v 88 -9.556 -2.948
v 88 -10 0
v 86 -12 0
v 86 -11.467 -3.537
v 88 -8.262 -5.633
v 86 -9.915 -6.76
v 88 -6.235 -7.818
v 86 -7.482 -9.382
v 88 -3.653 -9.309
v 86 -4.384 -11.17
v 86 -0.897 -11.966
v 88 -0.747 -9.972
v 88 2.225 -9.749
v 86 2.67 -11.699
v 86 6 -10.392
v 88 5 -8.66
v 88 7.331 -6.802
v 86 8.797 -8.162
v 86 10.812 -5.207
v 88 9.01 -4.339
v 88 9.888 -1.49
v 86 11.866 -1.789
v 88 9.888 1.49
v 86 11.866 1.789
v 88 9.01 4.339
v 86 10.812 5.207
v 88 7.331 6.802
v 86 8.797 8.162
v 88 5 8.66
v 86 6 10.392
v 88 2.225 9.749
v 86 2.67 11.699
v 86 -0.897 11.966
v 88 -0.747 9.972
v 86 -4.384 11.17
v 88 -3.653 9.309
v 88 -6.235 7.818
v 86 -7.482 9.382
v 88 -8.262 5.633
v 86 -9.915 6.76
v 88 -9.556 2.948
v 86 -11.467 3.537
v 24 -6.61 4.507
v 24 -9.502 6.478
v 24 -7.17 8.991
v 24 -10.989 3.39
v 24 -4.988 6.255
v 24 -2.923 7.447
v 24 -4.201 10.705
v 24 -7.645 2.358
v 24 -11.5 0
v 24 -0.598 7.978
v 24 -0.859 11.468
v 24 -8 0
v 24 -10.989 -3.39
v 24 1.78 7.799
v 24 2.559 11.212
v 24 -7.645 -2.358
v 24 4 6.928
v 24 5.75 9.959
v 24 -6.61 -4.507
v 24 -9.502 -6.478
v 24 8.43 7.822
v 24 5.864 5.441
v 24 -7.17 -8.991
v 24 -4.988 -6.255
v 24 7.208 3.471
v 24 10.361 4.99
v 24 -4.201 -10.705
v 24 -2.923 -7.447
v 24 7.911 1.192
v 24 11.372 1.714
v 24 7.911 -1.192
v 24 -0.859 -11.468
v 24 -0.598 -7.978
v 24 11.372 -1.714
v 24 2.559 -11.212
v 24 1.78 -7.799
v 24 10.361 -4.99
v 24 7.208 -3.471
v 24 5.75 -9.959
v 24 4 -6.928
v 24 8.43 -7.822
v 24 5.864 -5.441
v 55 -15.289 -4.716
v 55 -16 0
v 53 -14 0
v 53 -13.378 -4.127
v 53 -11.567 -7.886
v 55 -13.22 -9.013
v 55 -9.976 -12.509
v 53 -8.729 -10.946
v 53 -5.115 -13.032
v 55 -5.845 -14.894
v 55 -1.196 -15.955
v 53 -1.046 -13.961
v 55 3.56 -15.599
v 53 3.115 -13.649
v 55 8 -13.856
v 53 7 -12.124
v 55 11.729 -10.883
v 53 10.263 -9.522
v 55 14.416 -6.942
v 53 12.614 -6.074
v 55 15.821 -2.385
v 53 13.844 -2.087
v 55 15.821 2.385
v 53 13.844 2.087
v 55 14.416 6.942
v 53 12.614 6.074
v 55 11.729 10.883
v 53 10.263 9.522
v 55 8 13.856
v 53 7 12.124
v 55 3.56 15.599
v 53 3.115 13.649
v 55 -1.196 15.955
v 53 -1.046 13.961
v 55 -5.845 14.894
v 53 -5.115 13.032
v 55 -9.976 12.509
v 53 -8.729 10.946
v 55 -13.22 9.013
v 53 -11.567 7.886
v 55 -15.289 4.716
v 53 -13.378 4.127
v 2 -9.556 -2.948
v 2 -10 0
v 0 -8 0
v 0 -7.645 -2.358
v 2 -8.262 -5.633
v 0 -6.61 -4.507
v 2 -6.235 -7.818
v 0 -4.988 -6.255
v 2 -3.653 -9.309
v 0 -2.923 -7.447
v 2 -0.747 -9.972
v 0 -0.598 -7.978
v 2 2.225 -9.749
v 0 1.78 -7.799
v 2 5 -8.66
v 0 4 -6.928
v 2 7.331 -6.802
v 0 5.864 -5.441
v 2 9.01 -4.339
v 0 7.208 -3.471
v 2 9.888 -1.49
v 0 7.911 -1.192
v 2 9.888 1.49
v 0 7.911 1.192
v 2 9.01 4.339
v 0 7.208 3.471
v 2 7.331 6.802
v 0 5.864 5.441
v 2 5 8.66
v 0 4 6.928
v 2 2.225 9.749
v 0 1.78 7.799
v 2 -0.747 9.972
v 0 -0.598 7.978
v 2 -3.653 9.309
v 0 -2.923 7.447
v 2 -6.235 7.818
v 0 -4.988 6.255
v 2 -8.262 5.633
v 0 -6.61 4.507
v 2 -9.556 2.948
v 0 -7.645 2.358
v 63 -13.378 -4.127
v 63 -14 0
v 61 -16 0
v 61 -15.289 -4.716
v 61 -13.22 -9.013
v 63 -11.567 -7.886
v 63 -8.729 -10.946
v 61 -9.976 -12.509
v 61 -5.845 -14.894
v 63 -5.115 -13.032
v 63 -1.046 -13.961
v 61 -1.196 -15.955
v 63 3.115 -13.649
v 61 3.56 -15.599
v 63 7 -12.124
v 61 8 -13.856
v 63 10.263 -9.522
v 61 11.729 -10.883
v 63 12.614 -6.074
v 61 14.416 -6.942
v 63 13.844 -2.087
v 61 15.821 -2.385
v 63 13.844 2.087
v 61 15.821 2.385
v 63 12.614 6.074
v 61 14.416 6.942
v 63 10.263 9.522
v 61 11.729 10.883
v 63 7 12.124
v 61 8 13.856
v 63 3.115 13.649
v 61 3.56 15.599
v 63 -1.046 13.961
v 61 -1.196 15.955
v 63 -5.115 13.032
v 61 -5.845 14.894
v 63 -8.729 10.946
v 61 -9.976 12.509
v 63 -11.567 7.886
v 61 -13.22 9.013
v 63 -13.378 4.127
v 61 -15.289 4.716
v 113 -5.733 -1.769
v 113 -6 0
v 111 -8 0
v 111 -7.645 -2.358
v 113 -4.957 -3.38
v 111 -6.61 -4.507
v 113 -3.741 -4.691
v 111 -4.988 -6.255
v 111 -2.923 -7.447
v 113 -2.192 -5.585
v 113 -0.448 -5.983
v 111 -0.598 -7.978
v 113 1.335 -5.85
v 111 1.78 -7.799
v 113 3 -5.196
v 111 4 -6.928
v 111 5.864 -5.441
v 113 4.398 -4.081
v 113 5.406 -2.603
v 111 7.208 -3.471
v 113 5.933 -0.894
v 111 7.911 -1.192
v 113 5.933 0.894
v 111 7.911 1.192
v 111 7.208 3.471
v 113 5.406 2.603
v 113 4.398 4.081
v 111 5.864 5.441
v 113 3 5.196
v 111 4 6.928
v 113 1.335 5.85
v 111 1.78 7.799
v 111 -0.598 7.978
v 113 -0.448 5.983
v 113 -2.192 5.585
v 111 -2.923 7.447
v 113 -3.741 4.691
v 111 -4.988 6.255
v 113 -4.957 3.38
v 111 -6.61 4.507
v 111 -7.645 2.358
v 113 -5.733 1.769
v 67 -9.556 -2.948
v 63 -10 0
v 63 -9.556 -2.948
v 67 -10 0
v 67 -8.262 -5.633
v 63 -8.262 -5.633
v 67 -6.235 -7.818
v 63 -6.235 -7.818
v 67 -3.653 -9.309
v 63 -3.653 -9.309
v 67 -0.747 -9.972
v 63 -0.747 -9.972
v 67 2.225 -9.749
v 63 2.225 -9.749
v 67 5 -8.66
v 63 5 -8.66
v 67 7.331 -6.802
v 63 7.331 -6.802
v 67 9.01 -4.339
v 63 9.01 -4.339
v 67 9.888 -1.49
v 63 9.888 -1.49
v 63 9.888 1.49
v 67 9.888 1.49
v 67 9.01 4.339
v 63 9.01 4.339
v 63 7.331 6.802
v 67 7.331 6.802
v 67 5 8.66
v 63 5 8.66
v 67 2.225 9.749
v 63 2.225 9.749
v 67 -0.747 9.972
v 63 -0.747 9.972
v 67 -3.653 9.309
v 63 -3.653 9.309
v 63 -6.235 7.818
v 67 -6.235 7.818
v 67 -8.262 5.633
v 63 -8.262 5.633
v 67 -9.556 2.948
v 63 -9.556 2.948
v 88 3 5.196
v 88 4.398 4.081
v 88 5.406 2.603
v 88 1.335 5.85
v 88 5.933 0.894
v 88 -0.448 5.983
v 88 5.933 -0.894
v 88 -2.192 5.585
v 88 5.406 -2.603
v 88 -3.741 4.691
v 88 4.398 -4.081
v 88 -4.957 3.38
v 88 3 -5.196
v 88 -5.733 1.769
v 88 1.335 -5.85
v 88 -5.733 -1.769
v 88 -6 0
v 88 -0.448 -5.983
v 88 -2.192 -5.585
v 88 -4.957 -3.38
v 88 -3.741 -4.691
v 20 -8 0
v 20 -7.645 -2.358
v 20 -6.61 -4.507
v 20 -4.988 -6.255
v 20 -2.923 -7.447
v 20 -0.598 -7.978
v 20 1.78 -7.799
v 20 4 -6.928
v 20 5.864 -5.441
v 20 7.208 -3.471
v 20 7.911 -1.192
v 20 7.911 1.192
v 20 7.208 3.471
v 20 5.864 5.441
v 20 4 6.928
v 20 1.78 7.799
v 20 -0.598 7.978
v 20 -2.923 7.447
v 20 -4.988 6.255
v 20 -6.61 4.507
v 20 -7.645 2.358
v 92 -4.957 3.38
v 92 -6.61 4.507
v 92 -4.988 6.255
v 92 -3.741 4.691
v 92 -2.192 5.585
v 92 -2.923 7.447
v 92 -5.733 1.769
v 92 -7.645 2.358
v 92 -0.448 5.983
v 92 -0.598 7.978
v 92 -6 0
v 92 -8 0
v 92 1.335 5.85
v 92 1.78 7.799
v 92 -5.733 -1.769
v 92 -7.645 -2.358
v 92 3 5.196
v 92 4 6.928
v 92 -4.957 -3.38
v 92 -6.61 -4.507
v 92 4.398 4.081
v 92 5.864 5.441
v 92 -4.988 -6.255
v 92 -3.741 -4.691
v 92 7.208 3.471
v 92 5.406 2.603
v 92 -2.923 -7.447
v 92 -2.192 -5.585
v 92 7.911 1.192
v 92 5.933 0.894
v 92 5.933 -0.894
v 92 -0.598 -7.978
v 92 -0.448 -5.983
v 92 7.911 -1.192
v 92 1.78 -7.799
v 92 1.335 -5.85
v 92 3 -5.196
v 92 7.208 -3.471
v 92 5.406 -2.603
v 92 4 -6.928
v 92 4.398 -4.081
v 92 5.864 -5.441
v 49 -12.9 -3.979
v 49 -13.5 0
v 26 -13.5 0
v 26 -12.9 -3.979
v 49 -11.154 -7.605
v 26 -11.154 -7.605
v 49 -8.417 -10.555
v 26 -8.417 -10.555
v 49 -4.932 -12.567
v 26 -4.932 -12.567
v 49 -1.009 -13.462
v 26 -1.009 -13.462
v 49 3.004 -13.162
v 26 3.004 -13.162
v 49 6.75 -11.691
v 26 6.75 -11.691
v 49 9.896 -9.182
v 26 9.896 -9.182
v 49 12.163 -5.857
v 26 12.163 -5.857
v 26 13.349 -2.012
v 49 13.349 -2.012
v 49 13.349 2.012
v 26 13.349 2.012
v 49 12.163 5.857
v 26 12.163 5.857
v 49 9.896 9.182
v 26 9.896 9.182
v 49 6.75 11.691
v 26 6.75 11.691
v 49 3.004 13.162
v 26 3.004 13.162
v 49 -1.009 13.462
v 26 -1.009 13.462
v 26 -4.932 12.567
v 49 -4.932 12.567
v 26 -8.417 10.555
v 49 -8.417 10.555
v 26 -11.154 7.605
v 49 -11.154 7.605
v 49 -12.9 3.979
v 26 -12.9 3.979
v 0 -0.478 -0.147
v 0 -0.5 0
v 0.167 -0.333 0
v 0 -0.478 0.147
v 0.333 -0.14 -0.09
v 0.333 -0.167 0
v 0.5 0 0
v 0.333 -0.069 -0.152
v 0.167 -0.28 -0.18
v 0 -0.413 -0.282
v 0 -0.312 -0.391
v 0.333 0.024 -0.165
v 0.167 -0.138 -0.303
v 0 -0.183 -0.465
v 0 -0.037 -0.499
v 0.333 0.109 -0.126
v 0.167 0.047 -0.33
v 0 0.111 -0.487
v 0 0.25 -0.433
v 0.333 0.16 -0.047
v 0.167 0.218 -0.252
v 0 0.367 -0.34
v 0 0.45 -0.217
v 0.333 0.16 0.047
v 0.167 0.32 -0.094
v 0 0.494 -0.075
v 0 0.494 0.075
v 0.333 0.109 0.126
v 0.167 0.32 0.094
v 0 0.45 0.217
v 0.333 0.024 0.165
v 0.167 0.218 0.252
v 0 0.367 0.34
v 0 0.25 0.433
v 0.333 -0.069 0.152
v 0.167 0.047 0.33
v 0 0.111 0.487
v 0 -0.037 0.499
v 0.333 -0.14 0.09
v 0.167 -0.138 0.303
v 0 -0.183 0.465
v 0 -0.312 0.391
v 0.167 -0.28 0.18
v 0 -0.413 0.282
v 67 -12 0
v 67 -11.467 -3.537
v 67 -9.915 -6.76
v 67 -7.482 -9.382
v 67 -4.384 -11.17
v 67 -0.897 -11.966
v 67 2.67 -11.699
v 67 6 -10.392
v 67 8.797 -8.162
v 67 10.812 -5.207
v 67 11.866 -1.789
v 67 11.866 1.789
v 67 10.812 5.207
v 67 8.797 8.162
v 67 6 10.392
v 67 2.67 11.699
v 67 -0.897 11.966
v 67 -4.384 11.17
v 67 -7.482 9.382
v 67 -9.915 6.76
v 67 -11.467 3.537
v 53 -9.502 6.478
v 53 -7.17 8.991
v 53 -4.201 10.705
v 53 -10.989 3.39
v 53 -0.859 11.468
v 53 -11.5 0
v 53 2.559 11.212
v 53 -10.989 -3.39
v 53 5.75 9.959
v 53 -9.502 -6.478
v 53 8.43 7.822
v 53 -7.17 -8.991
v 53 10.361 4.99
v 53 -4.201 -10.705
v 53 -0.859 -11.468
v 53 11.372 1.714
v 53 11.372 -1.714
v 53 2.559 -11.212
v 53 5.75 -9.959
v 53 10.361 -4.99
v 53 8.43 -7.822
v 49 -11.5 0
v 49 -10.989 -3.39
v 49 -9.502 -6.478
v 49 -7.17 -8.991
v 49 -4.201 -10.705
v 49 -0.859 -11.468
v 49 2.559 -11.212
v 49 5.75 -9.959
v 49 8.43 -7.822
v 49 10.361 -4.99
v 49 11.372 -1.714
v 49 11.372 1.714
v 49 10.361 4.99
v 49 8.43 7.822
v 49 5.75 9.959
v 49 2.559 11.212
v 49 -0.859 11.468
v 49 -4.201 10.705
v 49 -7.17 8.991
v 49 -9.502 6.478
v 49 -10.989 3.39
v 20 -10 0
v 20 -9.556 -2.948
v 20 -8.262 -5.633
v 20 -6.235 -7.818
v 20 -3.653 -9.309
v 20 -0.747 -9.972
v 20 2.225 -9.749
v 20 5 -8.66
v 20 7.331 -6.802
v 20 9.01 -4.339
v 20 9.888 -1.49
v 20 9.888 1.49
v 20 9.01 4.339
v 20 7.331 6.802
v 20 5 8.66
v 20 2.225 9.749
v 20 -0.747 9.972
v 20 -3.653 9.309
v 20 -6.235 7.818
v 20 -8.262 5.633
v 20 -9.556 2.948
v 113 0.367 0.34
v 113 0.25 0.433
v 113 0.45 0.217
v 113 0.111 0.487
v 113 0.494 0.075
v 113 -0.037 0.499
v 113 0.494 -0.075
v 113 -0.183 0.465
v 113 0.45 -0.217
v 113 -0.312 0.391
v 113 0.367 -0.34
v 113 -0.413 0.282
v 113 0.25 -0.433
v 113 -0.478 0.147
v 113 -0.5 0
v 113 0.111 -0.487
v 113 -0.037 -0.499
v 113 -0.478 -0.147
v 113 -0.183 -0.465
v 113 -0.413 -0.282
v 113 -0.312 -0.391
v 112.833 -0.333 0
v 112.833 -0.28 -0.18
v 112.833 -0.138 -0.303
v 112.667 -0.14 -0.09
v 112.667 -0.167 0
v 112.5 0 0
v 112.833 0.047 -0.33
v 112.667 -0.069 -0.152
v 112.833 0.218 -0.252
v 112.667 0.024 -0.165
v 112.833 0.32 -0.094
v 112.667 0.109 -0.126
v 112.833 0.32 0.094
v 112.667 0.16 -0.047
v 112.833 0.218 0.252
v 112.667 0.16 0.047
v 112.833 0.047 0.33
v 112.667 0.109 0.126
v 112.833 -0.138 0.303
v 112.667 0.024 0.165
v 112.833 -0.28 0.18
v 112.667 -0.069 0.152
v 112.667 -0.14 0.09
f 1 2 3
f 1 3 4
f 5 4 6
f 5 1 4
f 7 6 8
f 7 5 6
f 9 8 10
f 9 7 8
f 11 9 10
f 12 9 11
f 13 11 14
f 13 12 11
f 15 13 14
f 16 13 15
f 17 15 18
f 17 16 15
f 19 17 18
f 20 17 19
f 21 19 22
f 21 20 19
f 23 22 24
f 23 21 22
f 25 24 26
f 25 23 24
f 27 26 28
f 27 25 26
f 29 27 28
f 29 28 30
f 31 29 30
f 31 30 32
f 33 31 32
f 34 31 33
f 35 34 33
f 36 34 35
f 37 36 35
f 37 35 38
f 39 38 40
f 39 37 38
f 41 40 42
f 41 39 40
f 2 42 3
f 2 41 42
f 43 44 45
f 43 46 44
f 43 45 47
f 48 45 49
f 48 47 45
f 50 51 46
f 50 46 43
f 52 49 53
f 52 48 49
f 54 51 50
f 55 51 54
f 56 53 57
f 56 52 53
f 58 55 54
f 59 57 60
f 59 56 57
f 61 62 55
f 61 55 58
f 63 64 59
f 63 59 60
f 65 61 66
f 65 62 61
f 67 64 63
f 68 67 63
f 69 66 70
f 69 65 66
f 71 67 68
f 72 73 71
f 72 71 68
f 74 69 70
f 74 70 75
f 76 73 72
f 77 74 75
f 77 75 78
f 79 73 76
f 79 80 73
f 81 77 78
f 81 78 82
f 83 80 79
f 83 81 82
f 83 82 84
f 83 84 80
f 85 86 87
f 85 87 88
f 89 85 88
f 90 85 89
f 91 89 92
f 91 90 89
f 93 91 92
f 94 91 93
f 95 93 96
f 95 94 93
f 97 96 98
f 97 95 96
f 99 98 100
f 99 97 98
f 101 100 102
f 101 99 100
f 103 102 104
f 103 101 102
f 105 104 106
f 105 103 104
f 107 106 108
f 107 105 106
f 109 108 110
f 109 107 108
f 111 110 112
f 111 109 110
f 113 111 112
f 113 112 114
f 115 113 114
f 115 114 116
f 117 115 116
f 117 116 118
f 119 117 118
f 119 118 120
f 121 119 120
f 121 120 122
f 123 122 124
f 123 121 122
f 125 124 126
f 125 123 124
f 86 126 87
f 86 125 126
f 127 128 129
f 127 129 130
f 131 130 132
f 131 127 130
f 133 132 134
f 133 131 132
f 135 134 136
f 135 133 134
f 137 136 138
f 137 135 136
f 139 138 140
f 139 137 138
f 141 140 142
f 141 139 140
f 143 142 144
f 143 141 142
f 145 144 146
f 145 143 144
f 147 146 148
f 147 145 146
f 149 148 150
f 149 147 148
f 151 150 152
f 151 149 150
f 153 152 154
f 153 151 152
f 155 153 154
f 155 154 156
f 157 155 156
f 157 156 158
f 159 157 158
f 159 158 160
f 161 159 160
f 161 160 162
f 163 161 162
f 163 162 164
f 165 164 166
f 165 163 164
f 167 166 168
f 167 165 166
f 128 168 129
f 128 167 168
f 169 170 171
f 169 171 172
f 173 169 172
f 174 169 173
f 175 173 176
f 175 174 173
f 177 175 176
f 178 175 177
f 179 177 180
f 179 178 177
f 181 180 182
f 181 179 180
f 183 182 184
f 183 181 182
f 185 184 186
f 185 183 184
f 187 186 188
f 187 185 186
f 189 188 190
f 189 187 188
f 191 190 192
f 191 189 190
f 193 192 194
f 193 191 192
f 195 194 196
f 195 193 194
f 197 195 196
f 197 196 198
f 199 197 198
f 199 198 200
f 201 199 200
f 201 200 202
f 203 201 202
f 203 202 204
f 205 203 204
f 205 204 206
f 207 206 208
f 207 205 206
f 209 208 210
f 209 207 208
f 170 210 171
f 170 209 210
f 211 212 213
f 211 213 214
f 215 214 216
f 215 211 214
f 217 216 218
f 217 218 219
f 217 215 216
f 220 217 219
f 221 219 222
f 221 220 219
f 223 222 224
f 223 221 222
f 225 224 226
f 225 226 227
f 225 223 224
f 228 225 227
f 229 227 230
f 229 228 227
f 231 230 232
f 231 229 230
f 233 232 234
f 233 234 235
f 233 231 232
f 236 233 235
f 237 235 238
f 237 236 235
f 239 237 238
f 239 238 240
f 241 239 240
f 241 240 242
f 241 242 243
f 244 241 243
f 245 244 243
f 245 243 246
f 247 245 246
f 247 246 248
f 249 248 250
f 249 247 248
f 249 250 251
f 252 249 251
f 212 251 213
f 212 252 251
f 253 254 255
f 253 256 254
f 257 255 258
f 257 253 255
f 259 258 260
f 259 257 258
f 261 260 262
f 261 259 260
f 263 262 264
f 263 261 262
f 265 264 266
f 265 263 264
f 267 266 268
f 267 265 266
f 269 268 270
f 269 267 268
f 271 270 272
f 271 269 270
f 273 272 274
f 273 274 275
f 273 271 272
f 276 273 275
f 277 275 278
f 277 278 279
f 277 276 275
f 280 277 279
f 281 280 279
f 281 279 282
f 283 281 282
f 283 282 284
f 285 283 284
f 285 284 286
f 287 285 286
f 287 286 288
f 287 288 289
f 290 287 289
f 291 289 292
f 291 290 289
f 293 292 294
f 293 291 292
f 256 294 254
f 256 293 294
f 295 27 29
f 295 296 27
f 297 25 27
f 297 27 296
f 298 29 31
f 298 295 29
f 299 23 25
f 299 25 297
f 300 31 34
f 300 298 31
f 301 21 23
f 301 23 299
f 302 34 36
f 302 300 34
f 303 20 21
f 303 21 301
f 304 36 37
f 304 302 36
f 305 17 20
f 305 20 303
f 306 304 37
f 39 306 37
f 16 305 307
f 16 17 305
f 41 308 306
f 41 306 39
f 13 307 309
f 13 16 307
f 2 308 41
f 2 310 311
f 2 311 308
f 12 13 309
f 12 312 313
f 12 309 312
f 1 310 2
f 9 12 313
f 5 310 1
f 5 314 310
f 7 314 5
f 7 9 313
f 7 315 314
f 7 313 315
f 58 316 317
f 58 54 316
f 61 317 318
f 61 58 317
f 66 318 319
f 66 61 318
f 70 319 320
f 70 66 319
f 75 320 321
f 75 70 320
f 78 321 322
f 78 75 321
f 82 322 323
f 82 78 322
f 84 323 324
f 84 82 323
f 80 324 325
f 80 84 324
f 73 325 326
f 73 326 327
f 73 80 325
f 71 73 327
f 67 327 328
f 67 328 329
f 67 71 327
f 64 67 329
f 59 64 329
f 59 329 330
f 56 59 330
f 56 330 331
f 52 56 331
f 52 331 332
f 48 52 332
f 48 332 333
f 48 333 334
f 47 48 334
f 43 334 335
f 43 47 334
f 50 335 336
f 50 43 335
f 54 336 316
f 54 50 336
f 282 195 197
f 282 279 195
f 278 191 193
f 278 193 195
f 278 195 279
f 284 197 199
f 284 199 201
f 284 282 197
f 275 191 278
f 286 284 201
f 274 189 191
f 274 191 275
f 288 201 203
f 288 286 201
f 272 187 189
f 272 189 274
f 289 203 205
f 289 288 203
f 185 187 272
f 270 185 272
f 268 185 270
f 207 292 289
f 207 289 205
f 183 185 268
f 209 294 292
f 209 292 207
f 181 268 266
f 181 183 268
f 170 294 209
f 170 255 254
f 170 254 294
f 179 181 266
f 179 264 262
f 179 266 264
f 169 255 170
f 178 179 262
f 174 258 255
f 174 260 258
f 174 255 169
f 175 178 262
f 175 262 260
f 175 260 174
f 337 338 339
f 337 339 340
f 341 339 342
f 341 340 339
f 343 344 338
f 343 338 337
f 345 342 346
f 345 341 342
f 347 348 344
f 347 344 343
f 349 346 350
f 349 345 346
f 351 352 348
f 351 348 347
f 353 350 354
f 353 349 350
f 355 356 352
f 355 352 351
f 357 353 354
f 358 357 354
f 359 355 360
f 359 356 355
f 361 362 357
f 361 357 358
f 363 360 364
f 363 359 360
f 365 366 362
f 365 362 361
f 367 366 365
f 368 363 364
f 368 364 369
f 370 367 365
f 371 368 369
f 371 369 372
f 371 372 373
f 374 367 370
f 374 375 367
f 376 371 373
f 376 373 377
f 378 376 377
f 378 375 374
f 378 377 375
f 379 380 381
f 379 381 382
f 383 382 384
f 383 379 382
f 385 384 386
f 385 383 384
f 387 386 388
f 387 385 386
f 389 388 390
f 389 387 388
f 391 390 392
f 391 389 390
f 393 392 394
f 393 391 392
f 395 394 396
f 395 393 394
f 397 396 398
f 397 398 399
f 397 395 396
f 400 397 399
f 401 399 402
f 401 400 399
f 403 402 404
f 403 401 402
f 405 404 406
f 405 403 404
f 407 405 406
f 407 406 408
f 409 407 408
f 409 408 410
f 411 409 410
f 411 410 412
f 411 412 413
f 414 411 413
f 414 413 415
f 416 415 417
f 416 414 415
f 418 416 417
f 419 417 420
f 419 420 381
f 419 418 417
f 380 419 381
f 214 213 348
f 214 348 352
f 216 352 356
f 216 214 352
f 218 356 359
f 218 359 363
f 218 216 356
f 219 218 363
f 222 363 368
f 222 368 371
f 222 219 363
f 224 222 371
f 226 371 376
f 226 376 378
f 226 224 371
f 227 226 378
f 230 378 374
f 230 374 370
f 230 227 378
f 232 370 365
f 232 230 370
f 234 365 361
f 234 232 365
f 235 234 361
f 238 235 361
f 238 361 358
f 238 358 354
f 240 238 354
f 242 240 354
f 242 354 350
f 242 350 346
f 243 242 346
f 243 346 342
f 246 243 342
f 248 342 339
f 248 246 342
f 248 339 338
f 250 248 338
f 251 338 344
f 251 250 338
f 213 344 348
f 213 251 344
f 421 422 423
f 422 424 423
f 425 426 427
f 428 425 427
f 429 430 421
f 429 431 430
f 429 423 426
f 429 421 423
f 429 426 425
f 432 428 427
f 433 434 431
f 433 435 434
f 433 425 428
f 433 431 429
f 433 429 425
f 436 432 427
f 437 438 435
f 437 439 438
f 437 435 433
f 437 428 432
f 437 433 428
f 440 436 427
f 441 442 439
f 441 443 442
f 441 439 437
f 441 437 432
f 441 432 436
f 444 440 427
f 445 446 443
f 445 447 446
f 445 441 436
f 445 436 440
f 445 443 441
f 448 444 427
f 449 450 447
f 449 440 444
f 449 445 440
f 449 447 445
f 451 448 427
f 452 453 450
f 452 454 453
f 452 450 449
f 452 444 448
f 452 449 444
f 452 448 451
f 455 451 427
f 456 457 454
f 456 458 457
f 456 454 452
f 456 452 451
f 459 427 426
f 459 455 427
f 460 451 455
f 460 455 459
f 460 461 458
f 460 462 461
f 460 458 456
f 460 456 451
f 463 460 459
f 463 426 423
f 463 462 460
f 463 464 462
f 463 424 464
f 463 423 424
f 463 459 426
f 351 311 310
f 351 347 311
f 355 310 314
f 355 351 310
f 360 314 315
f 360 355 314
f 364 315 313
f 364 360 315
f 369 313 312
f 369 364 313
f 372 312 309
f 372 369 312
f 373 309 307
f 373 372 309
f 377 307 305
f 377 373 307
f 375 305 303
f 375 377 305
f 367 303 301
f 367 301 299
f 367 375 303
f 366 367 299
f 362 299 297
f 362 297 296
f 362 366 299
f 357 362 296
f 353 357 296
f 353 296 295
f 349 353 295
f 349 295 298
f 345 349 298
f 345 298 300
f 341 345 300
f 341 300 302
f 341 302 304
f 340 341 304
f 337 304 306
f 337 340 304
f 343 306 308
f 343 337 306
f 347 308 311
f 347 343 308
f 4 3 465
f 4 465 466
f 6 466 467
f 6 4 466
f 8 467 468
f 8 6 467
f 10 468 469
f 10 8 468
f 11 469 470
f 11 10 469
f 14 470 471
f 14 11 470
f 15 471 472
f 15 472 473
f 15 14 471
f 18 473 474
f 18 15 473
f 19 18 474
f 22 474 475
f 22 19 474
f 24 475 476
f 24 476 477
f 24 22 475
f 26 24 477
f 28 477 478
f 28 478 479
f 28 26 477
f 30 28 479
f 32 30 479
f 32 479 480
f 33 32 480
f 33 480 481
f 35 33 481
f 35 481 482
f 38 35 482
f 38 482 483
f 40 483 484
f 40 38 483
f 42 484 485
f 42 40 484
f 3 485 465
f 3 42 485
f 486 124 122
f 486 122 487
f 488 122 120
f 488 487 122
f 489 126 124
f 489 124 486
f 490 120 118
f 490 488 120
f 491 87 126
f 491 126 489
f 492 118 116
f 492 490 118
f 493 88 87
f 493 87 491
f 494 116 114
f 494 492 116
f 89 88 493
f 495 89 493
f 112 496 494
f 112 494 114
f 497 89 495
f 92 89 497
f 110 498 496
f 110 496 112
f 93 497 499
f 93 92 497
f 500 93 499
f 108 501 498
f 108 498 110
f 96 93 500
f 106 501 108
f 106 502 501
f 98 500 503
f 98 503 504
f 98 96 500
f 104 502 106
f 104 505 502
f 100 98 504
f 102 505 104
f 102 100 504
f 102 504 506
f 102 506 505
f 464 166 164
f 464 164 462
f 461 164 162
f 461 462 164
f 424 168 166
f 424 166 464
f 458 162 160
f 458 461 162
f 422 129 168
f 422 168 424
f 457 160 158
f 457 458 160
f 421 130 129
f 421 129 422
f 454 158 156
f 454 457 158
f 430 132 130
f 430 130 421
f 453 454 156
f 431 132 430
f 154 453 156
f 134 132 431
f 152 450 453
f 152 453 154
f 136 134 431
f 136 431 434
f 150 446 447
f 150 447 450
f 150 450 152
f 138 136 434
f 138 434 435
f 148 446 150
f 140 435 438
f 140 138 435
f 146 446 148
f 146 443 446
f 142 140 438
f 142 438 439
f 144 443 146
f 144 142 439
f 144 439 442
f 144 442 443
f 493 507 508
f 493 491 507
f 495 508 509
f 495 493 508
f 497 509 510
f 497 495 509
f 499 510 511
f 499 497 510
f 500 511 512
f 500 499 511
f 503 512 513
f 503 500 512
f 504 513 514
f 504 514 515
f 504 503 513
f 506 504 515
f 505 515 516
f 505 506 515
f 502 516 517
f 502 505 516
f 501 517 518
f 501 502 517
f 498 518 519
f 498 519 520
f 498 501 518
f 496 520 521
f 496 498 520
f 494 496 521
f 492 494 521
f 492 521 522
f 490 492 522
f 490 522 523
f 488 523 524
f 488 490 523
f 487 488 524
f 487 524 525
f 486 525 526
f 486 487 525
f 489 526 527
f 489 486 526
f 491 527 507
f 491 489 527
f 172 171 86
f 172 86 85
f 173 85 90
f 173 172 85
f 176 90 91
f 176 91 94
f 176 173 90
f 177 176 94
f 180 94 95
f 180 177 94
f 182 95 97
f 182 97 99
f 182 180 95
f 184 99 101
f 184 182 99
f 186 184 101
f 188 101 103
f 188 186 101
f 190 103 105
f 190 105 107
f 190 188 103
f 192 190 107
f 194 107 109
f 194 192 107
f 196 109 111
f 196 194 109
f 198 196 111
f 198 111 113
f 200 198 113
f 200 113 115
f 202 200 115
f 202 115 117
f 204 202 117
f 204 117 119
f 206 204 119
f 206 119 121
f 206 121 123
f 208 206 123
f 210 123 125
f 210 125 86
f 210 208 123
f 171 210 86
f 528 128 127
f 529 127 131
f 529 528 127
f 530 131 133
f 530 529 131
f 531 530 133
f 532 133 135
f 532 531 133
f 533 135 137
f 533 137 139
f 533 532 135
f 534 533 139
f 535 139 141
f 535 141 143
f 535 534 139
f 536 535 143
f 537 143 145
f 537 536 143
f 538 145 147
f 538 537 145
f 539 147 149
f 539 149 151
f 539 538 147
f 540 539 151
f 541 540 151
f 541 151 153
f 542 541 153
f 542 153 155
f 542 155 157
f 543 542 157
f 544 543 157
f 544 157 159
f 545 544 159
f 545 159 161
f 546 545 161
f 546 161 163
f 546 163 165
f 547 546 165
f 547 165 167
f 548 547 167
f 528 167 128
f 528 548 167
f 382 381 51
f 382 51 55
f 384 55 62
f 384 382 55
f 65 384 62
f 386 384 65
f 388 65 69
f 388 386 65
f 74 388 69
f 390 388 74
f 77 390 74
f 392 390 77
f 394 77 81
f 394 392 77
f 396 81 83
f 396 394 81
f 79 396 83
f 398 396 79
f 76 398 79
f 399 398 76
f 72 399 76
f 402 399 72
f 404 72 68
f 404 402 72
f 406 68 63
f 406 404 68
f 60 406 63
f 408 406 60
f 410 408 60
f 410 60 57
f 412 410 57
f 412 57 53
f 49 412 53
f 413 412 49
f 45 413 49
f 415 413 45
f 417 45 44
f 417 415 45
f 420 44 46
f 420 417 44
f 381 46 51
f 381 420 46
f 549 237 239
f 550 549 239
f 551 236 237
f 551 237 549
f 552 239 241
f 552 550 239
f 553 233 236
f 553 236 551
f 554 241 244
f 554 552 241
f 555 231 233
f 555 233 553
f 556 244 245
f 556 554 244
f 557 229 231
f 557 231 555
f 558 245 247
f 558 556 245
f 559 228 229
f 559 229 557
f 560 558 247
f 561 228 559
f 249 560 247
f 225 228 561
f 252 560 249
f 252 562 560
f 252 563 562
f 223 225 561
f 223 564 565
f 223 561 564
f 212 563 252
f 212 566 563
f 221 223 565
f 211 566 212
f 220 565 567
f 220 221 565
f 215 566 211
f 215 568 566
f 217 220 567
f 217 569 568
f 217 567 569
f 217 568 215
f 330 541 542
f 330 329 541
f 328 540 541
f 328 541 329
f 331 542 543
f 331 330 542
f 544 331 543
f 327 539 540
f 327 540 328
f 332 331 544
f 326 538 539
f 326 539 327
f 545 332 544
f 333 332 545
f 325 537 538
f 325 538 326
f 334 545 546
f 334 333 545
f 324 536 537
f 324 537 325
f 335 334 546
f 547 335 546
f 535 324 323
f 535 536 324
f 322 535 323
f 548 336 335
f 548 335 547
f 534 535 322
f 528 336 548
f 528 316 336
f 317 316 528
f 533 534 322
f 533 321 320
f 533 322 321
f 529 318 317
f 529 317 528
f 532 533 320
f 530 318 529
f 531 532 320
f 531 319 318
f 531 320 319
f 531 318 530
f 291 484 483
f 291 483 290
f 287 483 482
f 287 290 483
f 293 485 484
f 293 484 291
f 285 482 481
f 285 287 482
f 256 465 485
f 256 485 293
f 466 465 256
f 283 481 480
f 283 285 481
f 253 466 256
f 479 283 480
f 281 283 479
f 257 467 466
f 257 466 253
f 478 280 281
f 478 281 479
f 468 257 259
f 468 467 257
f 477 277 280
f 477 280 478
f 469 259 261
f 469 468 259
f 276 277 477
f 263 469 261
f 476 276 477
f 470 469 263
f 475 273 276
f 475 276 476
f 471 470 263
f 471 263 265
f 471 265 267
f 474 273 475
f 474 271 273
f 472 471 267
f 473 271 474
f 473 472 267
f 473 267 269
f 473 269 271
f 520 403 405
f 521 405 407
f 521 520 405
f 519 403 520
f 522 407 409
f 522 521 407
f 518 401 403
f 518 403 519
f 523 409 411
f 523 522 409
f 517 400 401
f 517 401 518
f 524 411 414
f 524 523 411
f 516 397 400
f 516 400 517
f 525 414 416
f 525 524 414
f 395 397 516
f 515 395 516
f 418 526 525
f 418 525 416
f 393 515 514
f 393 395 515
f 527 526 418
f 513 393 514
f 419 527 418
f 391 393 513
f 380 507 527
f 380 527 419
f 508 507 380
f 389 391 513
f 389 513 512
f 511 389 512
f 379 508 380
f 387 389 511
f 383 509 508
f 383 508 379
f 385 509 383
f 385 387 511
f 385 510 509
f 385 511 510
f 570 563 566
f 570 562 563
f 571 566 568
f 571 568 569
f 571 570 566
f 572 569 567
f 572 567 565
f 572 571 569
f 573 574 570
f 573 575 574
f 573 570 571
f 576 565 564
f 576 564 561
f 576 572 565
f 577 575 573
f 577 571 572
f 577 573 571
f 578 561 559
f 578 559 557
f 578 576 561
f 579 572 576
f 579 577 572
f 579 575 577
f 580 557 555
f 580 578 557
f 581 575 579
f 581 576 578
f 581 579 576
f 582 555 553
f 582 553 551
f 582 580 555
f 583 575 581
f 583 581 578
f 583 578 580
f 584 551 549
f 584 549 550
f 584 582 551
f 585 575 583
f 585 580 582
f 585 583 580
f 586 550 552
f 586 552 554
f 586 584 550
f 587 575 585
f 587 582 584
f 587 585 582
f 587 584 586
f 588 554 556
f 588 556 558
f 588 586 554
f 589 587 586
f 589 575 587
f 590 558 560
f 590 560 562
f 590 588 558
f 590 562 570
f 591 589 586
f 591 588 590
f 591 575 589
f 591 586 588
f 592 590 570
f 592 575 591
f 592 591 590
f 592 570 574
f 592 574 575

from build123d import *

# Parameters (mm, degrees)
F0_W    = 4
F0_H    = 8
F0_H_2  = 10
F0_H_3  = 6
F2_SIZE = 2


with BuildPart() as f1:
    # F0 (on Top) → F1 (revolve)
    with BuildSketch(Plane.XY):
        Polygon((49, 0), (24, 0), (24, -8), (24, -13.5), (49, -13.5), (49, -11.5), (53, -11.5), (53, 0), align=None)
        Polygon((63, 0), (53, 0), (53, -11.5), (53, -13.5), (53, -16), (63, -16), (63, -10), align=None)
        with Locations((22, -4)):
            Rectangle(F0_W, F0_H)
        with Locations((65, -5)):
            Rectangle(F0_W, F0_H_2)
        Polygon((88, 0), (67, 0), (67, -10), (67, -12), (88, -12), (88, -6), align=None)
        with Locations((90, -3)):
            Rectangle(F0_W, F0_H_3)
        Polygon((20, 0), (0.5, 0), (0, -0.5), (0, -10), (20, -10), (20, -8), align=None)
        Polygon((112.5, 0), (92, 0), (92, -6), (92, -8), (113, -8), (113, -0.5), align=None)
    revolve(axis=Axis((10, 0, 0), (1, 0, 0)))

    # F2
    f2_edges = [f1.edges().sort_by_distance(p)[0] for p in [
        (0, 10, 0),
        (24, 13.5, 0),
        (53, 16, 0),
        (63, 16, 0),
        (88, 12, 0),
        (113, 8, 0),
    ]]
    chamfer(f2_edges, length=F2_SIZE)


solid = f1.part
